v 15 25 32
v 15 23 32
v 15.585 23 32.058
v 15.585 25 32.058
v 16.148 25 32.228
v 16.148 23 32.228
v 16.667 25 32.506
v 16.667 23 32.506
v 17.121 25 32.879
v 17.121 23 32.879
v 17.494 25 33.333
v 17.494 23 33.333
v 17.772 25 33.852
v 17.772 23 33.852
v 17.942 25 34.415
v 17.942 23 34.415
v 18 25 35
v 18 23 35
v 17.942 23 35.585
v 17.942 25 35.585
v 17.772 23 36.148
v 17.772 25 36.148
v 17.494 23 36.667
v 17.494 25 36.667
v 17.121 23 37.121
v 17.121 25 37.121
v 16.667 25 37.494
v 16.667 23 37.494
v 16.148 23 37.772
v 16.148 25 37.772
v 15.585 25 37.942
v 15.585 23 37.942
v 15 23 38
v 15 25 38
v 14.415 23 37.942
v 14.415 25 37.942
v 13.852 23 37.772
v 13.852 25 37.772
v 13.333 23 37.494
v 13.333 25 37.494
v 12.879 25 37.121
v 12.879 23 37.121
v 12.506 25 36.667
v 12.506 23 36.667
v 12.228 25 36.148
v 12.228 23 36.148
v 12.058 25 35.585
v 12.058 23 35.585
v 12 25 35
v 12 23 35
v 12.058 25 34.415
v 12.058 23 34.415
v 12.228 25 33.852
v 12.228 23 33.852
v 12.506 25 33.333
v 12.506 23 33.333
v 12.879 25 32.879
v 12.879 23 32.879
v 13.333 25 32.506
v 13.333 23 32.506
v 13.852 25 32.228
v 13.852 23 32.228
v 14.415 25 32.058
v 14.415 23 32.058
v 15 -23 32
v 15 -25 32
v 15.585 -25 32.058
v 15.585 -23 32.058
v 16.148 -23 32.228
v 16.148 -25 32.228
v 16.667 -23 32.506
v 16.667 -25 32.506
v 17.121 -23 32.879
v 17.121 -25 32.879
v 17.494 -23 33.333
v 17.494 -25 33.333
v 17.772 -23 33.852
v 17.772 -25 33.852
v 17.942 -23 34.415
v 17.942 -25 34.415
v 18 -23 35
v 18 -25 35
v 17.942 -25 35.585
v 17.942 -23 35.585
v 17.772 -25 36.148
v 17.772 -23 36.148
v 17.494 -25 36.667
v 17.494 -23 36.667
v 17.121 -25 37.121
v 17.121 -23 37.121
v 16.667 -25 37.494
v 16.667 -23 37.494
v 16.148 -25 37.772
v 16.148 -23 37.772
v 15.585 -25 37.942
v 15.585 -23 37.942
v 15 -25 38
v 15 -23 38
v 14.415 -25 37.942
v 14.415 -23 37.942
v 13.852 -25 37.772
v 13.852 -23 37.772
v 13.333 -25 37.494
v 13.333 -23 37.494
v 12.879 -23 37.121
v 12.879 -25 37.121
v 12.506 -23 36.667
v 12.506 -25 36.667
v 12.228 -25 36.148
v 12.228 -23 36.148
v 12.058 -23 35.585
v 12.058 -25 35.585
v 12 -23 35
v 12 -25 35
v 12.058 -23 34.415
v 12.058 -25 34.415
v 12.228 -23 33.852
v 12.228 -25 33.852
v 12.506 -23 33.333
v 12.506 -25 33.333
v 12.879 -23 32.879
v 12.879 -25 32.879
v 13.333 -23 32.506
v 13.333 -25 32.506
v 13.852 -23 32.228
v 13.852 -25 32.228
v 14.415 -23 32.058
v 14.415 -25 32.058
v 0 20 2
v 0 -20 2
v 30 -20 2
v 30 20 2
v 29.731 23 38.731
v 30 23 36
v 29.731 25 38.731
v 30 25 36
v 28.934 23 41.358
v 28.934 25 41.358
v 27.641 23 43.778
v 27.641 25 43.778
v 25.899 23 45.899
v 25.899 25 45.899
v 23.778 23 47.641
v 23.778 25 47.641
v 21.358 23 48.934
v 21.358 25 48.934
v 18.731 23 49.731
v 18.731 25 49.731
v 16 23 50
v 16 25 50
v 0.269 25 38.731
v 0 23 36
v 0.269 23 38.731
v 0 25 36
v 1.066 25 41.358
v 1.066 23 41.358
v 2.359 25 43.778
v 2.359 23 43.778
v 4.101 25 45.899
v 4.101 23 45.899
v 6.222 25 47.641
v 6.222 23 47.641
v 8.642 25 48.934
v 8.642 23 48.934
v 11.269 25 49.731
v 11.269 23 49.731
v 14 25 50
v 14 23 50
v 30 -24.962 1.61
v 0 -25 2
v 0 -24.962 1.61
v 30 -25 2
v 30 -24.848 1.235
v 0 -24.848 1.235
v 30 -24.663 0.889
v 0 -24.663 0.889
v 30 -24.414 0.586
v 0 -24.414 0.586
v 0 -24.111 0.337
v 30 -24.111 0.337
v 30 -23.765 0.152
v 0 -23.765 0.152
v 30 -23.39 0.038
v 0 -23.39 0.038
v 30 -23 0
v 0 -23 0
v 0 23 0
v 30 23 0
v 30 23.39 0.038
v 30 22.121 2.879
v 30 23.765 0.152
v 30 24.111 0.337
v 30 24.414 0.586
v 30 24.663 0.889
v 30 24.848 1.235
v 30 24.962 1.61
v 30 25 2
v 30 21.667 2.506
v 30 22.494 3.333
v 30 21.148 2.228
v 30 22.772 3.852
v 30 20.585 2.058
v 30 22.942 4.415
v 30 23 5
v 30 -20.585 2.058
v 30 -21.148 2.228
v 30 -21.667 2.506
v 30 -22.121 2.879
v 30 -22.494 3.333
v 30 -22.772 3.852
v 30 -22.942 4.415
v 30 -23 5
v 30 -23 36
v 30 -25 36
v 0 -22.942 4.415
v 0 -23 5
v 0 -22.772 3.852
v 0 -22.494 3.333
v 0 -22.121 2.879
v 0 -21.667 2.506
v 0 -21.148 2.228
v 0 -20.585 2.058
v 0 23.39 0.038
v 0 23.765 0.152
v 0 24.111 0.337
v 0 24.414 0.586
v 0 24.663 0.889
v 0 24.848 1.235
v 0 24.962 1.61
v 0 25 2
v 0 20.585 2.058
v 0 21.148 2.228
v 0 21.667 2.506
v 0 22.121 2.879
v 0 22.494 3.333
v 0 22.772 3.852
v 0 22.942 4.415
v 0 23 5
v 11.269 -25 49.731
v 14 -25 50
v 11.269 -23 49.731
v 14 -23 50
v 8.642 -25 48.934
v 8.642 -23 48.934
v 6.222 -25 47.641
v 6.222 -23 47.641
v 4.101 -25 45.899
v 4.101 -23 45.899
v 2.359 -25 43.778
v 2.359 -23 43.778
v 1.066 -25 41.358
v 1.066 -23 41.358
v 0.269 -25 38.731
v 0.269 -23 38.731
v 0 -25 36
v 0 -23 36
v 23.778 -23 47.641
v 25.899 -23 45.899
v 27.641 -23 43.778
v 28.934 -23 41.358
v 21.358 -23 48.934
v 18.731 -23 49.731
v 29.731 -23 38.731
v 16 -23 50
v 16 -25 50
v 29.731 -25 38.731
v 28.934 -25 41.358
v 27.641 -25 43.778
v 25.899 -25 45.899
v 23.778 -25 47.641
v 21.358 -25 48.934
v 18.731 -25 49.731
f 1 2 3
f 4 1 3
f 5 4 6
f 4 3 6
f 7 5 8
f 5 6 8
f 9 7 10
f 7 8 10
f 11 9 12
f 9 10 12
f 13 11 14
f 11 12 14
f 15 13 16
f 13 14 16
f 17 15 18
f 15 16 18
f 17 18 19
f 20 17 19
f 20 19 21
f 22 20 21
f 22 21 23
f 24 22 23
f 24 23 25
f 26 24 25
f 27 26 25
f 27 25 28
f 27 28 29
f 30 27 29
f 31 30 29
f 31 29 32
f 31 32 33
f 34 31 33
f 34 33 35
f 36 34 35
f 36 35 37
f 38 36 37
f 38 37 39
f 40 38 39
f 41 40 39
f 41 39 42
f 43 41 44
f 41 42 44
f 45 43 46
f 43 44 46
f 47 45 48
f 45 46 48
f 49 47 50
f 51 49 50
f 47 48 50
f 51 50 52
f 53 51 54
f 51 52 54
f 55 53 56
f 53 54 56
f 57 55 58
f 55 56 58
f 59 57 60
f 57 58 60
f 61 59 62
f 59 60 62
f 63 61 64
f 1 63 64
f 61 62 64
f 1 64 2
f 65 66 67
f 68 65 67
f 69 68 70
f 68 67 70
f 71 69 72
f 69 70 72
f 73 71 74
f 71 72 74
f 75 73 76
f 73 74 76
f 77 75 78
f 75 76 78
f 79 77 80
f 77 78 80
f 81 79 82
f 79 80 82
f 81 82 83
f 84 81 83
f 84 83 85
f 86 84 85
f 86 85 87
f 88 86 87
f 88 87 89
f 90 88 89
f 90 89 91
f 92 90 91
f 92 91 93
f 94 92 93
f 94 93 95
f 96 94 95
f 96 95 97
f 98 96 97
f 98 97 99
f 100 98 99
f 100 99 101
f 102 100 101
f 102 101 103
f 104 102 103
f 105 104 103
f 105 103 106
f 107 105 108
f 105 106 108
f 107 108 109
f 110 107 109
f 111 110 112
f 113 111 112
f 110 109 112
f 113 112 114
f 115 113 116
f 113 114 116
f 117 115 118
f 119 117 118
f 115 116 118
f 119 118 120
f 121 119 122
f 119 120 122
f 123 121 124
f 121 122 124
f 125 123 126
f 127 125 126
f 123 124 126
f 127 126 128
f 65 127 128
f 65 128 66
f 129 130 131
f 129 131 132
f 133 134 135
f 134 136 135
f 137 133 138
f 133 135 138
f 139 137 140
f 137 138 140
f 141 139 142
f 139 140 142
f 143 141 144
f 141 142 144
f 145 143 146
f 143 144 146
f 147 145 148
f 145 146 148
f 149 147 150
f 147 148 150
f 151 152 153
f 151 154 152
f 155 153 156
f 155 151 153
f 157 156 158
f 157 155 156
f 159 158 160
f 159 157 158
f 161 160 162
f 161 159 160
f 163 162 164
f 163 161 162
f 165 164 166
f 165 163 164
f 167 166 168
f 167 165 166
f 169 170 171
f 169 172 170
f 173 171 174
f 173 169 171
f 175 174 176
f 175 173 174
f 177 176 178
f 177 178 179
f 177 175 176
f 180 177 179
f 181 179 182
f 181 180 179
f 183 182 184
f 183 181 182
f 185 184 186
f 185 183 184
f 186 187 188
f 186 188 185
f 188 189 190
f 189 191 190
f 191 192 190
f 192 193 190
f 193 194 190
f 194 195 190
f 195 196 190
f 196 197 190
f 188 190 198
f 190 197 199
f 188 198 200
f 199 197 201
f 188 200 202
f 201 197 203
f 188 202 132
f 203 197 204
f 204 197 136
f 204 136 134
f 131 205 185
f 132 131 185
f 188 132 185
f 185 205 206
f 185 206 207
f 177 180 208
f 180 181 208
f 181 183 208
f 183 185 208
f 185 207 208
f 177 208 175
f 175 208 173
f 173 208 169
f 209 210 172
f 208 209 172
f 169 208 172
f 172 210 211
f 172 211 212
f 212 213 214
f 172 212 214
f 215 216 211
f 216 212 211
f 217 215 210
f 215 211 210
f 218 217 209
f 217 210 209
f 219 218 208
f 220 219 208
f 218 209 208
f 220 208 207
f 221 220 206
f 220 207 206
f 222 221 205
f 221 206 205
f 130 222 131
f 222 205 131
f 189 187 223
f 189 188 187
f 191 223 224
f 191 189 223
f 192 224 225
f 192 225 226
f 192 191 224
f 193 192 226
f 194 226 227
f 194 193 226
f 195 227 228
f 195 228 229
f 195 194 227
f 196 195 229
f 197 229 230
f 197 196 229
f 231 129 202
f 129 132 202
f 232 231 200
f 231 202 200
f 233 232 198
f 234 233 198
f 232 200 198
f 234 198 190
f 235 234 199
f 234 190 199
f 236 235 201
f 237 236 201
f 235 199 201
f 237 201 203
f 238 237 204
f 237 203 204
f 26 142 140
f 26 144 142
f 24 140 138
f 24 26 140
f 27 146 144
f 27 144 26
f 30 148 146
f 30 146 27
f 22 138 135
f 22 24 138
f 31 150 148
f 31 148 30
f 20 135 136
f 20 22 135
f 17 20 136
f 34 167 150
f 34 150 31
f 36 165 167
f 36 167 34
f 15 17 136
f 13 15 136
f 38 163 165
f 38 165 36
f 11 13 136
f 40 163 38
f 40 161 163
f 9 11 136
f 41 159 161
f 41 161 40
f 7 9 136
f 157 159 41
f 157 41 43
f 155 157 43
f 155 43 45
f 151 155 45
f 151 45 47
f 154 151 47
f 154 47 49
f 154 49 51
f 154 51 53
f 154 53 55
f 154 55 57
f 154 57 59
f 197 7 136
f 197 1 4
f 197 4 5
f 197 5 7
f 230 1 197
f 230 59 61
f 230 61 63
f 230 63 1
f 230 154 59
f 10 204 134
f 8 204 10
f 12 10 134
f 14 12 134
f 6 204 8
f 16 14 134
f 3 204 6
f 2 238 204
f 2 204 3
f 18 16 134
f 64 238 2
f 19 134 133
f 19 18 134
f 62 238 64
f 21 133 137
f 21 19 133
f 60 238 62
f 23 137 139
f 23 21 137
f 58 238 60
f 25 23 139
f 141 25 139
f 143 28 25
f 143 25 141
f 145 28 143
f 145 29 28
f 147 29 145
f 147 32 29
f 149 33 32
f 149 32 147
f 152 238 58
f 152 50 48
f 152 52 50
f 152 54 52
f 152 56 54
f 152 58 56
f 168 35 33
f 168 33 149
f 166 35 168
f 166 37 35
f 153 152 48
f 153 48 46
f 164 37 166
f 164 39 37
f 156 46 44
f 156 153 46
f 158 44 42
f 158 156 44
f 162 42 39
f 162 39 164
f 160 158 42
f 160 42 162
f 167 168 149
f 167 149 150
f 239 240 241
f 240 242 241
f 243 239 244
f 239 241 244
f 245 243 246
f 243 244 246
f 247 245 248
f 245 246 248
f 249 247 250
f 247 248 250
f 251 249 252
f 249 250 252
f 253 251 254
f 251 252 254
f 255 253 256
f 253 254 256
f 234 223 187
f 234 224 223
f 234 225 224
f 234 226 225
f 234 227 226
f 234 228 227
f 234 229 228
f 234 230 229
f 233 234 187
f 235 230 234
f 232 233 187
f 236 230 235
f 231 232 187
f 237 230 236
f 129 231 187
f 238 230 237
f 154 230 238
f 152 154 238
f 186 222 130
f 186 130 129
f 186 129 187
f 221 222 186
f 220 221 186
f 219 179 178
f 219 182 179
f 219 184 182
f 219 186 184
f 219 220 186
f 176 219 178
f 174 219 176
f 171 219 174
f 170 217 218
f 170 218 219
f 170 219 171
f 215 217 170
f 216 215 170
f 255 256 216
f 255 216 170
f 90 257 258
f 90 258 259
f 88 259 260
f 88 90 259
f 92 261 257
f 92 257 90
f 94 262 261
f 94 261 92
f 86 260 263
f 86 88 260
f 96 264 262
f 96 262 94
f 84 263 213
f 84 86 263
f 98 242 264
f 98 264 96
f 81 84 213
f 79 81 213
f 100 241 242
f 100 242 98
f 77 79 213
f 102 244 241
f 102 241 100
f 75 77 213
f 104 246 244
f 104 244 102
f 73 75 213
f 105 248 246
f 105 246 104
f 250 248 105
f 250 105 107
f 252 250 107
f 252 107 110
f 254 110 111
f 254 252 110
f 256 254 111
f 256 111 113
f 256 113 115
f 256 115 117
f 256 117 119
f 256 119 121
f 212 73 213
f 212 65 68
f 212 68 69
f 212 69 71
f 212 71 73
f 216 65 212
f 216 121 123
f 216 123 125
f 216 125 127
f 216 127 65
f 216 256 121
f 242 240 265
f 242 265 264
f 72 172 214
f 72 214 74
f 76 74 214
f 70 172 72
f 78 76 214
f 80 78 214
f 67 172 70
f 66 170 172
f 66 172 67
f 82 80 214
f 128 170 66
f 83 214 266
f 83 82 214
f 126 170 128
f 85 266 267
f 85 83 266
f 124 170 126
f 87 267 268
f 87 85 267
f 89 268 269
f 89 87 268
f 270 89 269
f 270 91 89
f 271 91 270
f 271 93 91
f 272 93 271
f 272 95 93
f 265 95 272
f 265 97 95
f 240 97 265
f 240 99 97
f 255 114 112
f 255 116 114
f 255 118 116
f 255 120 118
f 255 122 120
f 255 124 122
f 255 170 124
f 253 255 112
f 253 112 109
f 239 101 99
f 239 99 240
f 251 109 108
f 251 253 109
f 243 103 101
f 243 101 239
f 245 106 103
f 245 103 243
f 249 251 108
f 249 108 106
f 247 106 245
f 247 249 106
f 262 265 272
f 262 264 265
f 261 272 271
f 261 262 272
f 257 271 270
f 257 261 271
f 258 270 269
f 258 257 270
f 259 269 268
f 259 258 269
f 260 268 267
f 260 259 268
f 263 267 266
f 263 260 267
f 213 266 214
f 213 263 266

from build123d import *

# Parameters (mm, degrees)
PAD021_DEPTH  = 30
SKETCH003_R   = 3
HOLE004_DEPTH = 50.001
FILLET008_R   = 14
FILLET009_R   = 3
FILLET010_R   = 2


with BuildPart() as part:
    # Sketch002 → Pad021 (new body)
    with BuildSketch(Plane.YZ):
        Polygon((-25, 50), (-23, 50), (-23, 2), (23, 2), (23, 50), (25, 50), (25, 0), (-25, 0), align=None)
    extrude(amount=PAD021_DEPTH)

    # Sketch003 → Hole004 (cut, through all)
    with BuildSketch(Plane(origin=(0, -25, 0), x_dir=(0, 0, -1), z_dir=(0, -1, 0))):
        with Locations((-35, 15)):
            Circle(SKETCH003_R)
    extrude(amount=-HOLE004_DEPTH, mode=Mode.SUBTRACT)

    # Fillet008
    fillet008_edges = [part.edges().sort_by_distance(p)[0] for p in [
        (30, 24, 50),
        (30, -24, 50),
        (0, -24, 50),
        (0, 24, 50),
    ]]
    fillet(fillet008_edges, radius=FILLET008_R)

    # Fillet009
    fillet009_edges = [part.edges().sort_by_distance(p)[0] for p in [
        (15, -23, 2),
        (15, 23, 2),
    ]]
    fillet(fillet009_edges, radius=FILLET009_R)

    # Fillet010
    fillet010_edges = [part.edges().sort_by_distance(p)[0] for p in [
        (15, 25, 0),
        (15, -25, 0),
    ]]
    fillet(fillet010_edges, radius=FILLET010_R)


solid = part.part
